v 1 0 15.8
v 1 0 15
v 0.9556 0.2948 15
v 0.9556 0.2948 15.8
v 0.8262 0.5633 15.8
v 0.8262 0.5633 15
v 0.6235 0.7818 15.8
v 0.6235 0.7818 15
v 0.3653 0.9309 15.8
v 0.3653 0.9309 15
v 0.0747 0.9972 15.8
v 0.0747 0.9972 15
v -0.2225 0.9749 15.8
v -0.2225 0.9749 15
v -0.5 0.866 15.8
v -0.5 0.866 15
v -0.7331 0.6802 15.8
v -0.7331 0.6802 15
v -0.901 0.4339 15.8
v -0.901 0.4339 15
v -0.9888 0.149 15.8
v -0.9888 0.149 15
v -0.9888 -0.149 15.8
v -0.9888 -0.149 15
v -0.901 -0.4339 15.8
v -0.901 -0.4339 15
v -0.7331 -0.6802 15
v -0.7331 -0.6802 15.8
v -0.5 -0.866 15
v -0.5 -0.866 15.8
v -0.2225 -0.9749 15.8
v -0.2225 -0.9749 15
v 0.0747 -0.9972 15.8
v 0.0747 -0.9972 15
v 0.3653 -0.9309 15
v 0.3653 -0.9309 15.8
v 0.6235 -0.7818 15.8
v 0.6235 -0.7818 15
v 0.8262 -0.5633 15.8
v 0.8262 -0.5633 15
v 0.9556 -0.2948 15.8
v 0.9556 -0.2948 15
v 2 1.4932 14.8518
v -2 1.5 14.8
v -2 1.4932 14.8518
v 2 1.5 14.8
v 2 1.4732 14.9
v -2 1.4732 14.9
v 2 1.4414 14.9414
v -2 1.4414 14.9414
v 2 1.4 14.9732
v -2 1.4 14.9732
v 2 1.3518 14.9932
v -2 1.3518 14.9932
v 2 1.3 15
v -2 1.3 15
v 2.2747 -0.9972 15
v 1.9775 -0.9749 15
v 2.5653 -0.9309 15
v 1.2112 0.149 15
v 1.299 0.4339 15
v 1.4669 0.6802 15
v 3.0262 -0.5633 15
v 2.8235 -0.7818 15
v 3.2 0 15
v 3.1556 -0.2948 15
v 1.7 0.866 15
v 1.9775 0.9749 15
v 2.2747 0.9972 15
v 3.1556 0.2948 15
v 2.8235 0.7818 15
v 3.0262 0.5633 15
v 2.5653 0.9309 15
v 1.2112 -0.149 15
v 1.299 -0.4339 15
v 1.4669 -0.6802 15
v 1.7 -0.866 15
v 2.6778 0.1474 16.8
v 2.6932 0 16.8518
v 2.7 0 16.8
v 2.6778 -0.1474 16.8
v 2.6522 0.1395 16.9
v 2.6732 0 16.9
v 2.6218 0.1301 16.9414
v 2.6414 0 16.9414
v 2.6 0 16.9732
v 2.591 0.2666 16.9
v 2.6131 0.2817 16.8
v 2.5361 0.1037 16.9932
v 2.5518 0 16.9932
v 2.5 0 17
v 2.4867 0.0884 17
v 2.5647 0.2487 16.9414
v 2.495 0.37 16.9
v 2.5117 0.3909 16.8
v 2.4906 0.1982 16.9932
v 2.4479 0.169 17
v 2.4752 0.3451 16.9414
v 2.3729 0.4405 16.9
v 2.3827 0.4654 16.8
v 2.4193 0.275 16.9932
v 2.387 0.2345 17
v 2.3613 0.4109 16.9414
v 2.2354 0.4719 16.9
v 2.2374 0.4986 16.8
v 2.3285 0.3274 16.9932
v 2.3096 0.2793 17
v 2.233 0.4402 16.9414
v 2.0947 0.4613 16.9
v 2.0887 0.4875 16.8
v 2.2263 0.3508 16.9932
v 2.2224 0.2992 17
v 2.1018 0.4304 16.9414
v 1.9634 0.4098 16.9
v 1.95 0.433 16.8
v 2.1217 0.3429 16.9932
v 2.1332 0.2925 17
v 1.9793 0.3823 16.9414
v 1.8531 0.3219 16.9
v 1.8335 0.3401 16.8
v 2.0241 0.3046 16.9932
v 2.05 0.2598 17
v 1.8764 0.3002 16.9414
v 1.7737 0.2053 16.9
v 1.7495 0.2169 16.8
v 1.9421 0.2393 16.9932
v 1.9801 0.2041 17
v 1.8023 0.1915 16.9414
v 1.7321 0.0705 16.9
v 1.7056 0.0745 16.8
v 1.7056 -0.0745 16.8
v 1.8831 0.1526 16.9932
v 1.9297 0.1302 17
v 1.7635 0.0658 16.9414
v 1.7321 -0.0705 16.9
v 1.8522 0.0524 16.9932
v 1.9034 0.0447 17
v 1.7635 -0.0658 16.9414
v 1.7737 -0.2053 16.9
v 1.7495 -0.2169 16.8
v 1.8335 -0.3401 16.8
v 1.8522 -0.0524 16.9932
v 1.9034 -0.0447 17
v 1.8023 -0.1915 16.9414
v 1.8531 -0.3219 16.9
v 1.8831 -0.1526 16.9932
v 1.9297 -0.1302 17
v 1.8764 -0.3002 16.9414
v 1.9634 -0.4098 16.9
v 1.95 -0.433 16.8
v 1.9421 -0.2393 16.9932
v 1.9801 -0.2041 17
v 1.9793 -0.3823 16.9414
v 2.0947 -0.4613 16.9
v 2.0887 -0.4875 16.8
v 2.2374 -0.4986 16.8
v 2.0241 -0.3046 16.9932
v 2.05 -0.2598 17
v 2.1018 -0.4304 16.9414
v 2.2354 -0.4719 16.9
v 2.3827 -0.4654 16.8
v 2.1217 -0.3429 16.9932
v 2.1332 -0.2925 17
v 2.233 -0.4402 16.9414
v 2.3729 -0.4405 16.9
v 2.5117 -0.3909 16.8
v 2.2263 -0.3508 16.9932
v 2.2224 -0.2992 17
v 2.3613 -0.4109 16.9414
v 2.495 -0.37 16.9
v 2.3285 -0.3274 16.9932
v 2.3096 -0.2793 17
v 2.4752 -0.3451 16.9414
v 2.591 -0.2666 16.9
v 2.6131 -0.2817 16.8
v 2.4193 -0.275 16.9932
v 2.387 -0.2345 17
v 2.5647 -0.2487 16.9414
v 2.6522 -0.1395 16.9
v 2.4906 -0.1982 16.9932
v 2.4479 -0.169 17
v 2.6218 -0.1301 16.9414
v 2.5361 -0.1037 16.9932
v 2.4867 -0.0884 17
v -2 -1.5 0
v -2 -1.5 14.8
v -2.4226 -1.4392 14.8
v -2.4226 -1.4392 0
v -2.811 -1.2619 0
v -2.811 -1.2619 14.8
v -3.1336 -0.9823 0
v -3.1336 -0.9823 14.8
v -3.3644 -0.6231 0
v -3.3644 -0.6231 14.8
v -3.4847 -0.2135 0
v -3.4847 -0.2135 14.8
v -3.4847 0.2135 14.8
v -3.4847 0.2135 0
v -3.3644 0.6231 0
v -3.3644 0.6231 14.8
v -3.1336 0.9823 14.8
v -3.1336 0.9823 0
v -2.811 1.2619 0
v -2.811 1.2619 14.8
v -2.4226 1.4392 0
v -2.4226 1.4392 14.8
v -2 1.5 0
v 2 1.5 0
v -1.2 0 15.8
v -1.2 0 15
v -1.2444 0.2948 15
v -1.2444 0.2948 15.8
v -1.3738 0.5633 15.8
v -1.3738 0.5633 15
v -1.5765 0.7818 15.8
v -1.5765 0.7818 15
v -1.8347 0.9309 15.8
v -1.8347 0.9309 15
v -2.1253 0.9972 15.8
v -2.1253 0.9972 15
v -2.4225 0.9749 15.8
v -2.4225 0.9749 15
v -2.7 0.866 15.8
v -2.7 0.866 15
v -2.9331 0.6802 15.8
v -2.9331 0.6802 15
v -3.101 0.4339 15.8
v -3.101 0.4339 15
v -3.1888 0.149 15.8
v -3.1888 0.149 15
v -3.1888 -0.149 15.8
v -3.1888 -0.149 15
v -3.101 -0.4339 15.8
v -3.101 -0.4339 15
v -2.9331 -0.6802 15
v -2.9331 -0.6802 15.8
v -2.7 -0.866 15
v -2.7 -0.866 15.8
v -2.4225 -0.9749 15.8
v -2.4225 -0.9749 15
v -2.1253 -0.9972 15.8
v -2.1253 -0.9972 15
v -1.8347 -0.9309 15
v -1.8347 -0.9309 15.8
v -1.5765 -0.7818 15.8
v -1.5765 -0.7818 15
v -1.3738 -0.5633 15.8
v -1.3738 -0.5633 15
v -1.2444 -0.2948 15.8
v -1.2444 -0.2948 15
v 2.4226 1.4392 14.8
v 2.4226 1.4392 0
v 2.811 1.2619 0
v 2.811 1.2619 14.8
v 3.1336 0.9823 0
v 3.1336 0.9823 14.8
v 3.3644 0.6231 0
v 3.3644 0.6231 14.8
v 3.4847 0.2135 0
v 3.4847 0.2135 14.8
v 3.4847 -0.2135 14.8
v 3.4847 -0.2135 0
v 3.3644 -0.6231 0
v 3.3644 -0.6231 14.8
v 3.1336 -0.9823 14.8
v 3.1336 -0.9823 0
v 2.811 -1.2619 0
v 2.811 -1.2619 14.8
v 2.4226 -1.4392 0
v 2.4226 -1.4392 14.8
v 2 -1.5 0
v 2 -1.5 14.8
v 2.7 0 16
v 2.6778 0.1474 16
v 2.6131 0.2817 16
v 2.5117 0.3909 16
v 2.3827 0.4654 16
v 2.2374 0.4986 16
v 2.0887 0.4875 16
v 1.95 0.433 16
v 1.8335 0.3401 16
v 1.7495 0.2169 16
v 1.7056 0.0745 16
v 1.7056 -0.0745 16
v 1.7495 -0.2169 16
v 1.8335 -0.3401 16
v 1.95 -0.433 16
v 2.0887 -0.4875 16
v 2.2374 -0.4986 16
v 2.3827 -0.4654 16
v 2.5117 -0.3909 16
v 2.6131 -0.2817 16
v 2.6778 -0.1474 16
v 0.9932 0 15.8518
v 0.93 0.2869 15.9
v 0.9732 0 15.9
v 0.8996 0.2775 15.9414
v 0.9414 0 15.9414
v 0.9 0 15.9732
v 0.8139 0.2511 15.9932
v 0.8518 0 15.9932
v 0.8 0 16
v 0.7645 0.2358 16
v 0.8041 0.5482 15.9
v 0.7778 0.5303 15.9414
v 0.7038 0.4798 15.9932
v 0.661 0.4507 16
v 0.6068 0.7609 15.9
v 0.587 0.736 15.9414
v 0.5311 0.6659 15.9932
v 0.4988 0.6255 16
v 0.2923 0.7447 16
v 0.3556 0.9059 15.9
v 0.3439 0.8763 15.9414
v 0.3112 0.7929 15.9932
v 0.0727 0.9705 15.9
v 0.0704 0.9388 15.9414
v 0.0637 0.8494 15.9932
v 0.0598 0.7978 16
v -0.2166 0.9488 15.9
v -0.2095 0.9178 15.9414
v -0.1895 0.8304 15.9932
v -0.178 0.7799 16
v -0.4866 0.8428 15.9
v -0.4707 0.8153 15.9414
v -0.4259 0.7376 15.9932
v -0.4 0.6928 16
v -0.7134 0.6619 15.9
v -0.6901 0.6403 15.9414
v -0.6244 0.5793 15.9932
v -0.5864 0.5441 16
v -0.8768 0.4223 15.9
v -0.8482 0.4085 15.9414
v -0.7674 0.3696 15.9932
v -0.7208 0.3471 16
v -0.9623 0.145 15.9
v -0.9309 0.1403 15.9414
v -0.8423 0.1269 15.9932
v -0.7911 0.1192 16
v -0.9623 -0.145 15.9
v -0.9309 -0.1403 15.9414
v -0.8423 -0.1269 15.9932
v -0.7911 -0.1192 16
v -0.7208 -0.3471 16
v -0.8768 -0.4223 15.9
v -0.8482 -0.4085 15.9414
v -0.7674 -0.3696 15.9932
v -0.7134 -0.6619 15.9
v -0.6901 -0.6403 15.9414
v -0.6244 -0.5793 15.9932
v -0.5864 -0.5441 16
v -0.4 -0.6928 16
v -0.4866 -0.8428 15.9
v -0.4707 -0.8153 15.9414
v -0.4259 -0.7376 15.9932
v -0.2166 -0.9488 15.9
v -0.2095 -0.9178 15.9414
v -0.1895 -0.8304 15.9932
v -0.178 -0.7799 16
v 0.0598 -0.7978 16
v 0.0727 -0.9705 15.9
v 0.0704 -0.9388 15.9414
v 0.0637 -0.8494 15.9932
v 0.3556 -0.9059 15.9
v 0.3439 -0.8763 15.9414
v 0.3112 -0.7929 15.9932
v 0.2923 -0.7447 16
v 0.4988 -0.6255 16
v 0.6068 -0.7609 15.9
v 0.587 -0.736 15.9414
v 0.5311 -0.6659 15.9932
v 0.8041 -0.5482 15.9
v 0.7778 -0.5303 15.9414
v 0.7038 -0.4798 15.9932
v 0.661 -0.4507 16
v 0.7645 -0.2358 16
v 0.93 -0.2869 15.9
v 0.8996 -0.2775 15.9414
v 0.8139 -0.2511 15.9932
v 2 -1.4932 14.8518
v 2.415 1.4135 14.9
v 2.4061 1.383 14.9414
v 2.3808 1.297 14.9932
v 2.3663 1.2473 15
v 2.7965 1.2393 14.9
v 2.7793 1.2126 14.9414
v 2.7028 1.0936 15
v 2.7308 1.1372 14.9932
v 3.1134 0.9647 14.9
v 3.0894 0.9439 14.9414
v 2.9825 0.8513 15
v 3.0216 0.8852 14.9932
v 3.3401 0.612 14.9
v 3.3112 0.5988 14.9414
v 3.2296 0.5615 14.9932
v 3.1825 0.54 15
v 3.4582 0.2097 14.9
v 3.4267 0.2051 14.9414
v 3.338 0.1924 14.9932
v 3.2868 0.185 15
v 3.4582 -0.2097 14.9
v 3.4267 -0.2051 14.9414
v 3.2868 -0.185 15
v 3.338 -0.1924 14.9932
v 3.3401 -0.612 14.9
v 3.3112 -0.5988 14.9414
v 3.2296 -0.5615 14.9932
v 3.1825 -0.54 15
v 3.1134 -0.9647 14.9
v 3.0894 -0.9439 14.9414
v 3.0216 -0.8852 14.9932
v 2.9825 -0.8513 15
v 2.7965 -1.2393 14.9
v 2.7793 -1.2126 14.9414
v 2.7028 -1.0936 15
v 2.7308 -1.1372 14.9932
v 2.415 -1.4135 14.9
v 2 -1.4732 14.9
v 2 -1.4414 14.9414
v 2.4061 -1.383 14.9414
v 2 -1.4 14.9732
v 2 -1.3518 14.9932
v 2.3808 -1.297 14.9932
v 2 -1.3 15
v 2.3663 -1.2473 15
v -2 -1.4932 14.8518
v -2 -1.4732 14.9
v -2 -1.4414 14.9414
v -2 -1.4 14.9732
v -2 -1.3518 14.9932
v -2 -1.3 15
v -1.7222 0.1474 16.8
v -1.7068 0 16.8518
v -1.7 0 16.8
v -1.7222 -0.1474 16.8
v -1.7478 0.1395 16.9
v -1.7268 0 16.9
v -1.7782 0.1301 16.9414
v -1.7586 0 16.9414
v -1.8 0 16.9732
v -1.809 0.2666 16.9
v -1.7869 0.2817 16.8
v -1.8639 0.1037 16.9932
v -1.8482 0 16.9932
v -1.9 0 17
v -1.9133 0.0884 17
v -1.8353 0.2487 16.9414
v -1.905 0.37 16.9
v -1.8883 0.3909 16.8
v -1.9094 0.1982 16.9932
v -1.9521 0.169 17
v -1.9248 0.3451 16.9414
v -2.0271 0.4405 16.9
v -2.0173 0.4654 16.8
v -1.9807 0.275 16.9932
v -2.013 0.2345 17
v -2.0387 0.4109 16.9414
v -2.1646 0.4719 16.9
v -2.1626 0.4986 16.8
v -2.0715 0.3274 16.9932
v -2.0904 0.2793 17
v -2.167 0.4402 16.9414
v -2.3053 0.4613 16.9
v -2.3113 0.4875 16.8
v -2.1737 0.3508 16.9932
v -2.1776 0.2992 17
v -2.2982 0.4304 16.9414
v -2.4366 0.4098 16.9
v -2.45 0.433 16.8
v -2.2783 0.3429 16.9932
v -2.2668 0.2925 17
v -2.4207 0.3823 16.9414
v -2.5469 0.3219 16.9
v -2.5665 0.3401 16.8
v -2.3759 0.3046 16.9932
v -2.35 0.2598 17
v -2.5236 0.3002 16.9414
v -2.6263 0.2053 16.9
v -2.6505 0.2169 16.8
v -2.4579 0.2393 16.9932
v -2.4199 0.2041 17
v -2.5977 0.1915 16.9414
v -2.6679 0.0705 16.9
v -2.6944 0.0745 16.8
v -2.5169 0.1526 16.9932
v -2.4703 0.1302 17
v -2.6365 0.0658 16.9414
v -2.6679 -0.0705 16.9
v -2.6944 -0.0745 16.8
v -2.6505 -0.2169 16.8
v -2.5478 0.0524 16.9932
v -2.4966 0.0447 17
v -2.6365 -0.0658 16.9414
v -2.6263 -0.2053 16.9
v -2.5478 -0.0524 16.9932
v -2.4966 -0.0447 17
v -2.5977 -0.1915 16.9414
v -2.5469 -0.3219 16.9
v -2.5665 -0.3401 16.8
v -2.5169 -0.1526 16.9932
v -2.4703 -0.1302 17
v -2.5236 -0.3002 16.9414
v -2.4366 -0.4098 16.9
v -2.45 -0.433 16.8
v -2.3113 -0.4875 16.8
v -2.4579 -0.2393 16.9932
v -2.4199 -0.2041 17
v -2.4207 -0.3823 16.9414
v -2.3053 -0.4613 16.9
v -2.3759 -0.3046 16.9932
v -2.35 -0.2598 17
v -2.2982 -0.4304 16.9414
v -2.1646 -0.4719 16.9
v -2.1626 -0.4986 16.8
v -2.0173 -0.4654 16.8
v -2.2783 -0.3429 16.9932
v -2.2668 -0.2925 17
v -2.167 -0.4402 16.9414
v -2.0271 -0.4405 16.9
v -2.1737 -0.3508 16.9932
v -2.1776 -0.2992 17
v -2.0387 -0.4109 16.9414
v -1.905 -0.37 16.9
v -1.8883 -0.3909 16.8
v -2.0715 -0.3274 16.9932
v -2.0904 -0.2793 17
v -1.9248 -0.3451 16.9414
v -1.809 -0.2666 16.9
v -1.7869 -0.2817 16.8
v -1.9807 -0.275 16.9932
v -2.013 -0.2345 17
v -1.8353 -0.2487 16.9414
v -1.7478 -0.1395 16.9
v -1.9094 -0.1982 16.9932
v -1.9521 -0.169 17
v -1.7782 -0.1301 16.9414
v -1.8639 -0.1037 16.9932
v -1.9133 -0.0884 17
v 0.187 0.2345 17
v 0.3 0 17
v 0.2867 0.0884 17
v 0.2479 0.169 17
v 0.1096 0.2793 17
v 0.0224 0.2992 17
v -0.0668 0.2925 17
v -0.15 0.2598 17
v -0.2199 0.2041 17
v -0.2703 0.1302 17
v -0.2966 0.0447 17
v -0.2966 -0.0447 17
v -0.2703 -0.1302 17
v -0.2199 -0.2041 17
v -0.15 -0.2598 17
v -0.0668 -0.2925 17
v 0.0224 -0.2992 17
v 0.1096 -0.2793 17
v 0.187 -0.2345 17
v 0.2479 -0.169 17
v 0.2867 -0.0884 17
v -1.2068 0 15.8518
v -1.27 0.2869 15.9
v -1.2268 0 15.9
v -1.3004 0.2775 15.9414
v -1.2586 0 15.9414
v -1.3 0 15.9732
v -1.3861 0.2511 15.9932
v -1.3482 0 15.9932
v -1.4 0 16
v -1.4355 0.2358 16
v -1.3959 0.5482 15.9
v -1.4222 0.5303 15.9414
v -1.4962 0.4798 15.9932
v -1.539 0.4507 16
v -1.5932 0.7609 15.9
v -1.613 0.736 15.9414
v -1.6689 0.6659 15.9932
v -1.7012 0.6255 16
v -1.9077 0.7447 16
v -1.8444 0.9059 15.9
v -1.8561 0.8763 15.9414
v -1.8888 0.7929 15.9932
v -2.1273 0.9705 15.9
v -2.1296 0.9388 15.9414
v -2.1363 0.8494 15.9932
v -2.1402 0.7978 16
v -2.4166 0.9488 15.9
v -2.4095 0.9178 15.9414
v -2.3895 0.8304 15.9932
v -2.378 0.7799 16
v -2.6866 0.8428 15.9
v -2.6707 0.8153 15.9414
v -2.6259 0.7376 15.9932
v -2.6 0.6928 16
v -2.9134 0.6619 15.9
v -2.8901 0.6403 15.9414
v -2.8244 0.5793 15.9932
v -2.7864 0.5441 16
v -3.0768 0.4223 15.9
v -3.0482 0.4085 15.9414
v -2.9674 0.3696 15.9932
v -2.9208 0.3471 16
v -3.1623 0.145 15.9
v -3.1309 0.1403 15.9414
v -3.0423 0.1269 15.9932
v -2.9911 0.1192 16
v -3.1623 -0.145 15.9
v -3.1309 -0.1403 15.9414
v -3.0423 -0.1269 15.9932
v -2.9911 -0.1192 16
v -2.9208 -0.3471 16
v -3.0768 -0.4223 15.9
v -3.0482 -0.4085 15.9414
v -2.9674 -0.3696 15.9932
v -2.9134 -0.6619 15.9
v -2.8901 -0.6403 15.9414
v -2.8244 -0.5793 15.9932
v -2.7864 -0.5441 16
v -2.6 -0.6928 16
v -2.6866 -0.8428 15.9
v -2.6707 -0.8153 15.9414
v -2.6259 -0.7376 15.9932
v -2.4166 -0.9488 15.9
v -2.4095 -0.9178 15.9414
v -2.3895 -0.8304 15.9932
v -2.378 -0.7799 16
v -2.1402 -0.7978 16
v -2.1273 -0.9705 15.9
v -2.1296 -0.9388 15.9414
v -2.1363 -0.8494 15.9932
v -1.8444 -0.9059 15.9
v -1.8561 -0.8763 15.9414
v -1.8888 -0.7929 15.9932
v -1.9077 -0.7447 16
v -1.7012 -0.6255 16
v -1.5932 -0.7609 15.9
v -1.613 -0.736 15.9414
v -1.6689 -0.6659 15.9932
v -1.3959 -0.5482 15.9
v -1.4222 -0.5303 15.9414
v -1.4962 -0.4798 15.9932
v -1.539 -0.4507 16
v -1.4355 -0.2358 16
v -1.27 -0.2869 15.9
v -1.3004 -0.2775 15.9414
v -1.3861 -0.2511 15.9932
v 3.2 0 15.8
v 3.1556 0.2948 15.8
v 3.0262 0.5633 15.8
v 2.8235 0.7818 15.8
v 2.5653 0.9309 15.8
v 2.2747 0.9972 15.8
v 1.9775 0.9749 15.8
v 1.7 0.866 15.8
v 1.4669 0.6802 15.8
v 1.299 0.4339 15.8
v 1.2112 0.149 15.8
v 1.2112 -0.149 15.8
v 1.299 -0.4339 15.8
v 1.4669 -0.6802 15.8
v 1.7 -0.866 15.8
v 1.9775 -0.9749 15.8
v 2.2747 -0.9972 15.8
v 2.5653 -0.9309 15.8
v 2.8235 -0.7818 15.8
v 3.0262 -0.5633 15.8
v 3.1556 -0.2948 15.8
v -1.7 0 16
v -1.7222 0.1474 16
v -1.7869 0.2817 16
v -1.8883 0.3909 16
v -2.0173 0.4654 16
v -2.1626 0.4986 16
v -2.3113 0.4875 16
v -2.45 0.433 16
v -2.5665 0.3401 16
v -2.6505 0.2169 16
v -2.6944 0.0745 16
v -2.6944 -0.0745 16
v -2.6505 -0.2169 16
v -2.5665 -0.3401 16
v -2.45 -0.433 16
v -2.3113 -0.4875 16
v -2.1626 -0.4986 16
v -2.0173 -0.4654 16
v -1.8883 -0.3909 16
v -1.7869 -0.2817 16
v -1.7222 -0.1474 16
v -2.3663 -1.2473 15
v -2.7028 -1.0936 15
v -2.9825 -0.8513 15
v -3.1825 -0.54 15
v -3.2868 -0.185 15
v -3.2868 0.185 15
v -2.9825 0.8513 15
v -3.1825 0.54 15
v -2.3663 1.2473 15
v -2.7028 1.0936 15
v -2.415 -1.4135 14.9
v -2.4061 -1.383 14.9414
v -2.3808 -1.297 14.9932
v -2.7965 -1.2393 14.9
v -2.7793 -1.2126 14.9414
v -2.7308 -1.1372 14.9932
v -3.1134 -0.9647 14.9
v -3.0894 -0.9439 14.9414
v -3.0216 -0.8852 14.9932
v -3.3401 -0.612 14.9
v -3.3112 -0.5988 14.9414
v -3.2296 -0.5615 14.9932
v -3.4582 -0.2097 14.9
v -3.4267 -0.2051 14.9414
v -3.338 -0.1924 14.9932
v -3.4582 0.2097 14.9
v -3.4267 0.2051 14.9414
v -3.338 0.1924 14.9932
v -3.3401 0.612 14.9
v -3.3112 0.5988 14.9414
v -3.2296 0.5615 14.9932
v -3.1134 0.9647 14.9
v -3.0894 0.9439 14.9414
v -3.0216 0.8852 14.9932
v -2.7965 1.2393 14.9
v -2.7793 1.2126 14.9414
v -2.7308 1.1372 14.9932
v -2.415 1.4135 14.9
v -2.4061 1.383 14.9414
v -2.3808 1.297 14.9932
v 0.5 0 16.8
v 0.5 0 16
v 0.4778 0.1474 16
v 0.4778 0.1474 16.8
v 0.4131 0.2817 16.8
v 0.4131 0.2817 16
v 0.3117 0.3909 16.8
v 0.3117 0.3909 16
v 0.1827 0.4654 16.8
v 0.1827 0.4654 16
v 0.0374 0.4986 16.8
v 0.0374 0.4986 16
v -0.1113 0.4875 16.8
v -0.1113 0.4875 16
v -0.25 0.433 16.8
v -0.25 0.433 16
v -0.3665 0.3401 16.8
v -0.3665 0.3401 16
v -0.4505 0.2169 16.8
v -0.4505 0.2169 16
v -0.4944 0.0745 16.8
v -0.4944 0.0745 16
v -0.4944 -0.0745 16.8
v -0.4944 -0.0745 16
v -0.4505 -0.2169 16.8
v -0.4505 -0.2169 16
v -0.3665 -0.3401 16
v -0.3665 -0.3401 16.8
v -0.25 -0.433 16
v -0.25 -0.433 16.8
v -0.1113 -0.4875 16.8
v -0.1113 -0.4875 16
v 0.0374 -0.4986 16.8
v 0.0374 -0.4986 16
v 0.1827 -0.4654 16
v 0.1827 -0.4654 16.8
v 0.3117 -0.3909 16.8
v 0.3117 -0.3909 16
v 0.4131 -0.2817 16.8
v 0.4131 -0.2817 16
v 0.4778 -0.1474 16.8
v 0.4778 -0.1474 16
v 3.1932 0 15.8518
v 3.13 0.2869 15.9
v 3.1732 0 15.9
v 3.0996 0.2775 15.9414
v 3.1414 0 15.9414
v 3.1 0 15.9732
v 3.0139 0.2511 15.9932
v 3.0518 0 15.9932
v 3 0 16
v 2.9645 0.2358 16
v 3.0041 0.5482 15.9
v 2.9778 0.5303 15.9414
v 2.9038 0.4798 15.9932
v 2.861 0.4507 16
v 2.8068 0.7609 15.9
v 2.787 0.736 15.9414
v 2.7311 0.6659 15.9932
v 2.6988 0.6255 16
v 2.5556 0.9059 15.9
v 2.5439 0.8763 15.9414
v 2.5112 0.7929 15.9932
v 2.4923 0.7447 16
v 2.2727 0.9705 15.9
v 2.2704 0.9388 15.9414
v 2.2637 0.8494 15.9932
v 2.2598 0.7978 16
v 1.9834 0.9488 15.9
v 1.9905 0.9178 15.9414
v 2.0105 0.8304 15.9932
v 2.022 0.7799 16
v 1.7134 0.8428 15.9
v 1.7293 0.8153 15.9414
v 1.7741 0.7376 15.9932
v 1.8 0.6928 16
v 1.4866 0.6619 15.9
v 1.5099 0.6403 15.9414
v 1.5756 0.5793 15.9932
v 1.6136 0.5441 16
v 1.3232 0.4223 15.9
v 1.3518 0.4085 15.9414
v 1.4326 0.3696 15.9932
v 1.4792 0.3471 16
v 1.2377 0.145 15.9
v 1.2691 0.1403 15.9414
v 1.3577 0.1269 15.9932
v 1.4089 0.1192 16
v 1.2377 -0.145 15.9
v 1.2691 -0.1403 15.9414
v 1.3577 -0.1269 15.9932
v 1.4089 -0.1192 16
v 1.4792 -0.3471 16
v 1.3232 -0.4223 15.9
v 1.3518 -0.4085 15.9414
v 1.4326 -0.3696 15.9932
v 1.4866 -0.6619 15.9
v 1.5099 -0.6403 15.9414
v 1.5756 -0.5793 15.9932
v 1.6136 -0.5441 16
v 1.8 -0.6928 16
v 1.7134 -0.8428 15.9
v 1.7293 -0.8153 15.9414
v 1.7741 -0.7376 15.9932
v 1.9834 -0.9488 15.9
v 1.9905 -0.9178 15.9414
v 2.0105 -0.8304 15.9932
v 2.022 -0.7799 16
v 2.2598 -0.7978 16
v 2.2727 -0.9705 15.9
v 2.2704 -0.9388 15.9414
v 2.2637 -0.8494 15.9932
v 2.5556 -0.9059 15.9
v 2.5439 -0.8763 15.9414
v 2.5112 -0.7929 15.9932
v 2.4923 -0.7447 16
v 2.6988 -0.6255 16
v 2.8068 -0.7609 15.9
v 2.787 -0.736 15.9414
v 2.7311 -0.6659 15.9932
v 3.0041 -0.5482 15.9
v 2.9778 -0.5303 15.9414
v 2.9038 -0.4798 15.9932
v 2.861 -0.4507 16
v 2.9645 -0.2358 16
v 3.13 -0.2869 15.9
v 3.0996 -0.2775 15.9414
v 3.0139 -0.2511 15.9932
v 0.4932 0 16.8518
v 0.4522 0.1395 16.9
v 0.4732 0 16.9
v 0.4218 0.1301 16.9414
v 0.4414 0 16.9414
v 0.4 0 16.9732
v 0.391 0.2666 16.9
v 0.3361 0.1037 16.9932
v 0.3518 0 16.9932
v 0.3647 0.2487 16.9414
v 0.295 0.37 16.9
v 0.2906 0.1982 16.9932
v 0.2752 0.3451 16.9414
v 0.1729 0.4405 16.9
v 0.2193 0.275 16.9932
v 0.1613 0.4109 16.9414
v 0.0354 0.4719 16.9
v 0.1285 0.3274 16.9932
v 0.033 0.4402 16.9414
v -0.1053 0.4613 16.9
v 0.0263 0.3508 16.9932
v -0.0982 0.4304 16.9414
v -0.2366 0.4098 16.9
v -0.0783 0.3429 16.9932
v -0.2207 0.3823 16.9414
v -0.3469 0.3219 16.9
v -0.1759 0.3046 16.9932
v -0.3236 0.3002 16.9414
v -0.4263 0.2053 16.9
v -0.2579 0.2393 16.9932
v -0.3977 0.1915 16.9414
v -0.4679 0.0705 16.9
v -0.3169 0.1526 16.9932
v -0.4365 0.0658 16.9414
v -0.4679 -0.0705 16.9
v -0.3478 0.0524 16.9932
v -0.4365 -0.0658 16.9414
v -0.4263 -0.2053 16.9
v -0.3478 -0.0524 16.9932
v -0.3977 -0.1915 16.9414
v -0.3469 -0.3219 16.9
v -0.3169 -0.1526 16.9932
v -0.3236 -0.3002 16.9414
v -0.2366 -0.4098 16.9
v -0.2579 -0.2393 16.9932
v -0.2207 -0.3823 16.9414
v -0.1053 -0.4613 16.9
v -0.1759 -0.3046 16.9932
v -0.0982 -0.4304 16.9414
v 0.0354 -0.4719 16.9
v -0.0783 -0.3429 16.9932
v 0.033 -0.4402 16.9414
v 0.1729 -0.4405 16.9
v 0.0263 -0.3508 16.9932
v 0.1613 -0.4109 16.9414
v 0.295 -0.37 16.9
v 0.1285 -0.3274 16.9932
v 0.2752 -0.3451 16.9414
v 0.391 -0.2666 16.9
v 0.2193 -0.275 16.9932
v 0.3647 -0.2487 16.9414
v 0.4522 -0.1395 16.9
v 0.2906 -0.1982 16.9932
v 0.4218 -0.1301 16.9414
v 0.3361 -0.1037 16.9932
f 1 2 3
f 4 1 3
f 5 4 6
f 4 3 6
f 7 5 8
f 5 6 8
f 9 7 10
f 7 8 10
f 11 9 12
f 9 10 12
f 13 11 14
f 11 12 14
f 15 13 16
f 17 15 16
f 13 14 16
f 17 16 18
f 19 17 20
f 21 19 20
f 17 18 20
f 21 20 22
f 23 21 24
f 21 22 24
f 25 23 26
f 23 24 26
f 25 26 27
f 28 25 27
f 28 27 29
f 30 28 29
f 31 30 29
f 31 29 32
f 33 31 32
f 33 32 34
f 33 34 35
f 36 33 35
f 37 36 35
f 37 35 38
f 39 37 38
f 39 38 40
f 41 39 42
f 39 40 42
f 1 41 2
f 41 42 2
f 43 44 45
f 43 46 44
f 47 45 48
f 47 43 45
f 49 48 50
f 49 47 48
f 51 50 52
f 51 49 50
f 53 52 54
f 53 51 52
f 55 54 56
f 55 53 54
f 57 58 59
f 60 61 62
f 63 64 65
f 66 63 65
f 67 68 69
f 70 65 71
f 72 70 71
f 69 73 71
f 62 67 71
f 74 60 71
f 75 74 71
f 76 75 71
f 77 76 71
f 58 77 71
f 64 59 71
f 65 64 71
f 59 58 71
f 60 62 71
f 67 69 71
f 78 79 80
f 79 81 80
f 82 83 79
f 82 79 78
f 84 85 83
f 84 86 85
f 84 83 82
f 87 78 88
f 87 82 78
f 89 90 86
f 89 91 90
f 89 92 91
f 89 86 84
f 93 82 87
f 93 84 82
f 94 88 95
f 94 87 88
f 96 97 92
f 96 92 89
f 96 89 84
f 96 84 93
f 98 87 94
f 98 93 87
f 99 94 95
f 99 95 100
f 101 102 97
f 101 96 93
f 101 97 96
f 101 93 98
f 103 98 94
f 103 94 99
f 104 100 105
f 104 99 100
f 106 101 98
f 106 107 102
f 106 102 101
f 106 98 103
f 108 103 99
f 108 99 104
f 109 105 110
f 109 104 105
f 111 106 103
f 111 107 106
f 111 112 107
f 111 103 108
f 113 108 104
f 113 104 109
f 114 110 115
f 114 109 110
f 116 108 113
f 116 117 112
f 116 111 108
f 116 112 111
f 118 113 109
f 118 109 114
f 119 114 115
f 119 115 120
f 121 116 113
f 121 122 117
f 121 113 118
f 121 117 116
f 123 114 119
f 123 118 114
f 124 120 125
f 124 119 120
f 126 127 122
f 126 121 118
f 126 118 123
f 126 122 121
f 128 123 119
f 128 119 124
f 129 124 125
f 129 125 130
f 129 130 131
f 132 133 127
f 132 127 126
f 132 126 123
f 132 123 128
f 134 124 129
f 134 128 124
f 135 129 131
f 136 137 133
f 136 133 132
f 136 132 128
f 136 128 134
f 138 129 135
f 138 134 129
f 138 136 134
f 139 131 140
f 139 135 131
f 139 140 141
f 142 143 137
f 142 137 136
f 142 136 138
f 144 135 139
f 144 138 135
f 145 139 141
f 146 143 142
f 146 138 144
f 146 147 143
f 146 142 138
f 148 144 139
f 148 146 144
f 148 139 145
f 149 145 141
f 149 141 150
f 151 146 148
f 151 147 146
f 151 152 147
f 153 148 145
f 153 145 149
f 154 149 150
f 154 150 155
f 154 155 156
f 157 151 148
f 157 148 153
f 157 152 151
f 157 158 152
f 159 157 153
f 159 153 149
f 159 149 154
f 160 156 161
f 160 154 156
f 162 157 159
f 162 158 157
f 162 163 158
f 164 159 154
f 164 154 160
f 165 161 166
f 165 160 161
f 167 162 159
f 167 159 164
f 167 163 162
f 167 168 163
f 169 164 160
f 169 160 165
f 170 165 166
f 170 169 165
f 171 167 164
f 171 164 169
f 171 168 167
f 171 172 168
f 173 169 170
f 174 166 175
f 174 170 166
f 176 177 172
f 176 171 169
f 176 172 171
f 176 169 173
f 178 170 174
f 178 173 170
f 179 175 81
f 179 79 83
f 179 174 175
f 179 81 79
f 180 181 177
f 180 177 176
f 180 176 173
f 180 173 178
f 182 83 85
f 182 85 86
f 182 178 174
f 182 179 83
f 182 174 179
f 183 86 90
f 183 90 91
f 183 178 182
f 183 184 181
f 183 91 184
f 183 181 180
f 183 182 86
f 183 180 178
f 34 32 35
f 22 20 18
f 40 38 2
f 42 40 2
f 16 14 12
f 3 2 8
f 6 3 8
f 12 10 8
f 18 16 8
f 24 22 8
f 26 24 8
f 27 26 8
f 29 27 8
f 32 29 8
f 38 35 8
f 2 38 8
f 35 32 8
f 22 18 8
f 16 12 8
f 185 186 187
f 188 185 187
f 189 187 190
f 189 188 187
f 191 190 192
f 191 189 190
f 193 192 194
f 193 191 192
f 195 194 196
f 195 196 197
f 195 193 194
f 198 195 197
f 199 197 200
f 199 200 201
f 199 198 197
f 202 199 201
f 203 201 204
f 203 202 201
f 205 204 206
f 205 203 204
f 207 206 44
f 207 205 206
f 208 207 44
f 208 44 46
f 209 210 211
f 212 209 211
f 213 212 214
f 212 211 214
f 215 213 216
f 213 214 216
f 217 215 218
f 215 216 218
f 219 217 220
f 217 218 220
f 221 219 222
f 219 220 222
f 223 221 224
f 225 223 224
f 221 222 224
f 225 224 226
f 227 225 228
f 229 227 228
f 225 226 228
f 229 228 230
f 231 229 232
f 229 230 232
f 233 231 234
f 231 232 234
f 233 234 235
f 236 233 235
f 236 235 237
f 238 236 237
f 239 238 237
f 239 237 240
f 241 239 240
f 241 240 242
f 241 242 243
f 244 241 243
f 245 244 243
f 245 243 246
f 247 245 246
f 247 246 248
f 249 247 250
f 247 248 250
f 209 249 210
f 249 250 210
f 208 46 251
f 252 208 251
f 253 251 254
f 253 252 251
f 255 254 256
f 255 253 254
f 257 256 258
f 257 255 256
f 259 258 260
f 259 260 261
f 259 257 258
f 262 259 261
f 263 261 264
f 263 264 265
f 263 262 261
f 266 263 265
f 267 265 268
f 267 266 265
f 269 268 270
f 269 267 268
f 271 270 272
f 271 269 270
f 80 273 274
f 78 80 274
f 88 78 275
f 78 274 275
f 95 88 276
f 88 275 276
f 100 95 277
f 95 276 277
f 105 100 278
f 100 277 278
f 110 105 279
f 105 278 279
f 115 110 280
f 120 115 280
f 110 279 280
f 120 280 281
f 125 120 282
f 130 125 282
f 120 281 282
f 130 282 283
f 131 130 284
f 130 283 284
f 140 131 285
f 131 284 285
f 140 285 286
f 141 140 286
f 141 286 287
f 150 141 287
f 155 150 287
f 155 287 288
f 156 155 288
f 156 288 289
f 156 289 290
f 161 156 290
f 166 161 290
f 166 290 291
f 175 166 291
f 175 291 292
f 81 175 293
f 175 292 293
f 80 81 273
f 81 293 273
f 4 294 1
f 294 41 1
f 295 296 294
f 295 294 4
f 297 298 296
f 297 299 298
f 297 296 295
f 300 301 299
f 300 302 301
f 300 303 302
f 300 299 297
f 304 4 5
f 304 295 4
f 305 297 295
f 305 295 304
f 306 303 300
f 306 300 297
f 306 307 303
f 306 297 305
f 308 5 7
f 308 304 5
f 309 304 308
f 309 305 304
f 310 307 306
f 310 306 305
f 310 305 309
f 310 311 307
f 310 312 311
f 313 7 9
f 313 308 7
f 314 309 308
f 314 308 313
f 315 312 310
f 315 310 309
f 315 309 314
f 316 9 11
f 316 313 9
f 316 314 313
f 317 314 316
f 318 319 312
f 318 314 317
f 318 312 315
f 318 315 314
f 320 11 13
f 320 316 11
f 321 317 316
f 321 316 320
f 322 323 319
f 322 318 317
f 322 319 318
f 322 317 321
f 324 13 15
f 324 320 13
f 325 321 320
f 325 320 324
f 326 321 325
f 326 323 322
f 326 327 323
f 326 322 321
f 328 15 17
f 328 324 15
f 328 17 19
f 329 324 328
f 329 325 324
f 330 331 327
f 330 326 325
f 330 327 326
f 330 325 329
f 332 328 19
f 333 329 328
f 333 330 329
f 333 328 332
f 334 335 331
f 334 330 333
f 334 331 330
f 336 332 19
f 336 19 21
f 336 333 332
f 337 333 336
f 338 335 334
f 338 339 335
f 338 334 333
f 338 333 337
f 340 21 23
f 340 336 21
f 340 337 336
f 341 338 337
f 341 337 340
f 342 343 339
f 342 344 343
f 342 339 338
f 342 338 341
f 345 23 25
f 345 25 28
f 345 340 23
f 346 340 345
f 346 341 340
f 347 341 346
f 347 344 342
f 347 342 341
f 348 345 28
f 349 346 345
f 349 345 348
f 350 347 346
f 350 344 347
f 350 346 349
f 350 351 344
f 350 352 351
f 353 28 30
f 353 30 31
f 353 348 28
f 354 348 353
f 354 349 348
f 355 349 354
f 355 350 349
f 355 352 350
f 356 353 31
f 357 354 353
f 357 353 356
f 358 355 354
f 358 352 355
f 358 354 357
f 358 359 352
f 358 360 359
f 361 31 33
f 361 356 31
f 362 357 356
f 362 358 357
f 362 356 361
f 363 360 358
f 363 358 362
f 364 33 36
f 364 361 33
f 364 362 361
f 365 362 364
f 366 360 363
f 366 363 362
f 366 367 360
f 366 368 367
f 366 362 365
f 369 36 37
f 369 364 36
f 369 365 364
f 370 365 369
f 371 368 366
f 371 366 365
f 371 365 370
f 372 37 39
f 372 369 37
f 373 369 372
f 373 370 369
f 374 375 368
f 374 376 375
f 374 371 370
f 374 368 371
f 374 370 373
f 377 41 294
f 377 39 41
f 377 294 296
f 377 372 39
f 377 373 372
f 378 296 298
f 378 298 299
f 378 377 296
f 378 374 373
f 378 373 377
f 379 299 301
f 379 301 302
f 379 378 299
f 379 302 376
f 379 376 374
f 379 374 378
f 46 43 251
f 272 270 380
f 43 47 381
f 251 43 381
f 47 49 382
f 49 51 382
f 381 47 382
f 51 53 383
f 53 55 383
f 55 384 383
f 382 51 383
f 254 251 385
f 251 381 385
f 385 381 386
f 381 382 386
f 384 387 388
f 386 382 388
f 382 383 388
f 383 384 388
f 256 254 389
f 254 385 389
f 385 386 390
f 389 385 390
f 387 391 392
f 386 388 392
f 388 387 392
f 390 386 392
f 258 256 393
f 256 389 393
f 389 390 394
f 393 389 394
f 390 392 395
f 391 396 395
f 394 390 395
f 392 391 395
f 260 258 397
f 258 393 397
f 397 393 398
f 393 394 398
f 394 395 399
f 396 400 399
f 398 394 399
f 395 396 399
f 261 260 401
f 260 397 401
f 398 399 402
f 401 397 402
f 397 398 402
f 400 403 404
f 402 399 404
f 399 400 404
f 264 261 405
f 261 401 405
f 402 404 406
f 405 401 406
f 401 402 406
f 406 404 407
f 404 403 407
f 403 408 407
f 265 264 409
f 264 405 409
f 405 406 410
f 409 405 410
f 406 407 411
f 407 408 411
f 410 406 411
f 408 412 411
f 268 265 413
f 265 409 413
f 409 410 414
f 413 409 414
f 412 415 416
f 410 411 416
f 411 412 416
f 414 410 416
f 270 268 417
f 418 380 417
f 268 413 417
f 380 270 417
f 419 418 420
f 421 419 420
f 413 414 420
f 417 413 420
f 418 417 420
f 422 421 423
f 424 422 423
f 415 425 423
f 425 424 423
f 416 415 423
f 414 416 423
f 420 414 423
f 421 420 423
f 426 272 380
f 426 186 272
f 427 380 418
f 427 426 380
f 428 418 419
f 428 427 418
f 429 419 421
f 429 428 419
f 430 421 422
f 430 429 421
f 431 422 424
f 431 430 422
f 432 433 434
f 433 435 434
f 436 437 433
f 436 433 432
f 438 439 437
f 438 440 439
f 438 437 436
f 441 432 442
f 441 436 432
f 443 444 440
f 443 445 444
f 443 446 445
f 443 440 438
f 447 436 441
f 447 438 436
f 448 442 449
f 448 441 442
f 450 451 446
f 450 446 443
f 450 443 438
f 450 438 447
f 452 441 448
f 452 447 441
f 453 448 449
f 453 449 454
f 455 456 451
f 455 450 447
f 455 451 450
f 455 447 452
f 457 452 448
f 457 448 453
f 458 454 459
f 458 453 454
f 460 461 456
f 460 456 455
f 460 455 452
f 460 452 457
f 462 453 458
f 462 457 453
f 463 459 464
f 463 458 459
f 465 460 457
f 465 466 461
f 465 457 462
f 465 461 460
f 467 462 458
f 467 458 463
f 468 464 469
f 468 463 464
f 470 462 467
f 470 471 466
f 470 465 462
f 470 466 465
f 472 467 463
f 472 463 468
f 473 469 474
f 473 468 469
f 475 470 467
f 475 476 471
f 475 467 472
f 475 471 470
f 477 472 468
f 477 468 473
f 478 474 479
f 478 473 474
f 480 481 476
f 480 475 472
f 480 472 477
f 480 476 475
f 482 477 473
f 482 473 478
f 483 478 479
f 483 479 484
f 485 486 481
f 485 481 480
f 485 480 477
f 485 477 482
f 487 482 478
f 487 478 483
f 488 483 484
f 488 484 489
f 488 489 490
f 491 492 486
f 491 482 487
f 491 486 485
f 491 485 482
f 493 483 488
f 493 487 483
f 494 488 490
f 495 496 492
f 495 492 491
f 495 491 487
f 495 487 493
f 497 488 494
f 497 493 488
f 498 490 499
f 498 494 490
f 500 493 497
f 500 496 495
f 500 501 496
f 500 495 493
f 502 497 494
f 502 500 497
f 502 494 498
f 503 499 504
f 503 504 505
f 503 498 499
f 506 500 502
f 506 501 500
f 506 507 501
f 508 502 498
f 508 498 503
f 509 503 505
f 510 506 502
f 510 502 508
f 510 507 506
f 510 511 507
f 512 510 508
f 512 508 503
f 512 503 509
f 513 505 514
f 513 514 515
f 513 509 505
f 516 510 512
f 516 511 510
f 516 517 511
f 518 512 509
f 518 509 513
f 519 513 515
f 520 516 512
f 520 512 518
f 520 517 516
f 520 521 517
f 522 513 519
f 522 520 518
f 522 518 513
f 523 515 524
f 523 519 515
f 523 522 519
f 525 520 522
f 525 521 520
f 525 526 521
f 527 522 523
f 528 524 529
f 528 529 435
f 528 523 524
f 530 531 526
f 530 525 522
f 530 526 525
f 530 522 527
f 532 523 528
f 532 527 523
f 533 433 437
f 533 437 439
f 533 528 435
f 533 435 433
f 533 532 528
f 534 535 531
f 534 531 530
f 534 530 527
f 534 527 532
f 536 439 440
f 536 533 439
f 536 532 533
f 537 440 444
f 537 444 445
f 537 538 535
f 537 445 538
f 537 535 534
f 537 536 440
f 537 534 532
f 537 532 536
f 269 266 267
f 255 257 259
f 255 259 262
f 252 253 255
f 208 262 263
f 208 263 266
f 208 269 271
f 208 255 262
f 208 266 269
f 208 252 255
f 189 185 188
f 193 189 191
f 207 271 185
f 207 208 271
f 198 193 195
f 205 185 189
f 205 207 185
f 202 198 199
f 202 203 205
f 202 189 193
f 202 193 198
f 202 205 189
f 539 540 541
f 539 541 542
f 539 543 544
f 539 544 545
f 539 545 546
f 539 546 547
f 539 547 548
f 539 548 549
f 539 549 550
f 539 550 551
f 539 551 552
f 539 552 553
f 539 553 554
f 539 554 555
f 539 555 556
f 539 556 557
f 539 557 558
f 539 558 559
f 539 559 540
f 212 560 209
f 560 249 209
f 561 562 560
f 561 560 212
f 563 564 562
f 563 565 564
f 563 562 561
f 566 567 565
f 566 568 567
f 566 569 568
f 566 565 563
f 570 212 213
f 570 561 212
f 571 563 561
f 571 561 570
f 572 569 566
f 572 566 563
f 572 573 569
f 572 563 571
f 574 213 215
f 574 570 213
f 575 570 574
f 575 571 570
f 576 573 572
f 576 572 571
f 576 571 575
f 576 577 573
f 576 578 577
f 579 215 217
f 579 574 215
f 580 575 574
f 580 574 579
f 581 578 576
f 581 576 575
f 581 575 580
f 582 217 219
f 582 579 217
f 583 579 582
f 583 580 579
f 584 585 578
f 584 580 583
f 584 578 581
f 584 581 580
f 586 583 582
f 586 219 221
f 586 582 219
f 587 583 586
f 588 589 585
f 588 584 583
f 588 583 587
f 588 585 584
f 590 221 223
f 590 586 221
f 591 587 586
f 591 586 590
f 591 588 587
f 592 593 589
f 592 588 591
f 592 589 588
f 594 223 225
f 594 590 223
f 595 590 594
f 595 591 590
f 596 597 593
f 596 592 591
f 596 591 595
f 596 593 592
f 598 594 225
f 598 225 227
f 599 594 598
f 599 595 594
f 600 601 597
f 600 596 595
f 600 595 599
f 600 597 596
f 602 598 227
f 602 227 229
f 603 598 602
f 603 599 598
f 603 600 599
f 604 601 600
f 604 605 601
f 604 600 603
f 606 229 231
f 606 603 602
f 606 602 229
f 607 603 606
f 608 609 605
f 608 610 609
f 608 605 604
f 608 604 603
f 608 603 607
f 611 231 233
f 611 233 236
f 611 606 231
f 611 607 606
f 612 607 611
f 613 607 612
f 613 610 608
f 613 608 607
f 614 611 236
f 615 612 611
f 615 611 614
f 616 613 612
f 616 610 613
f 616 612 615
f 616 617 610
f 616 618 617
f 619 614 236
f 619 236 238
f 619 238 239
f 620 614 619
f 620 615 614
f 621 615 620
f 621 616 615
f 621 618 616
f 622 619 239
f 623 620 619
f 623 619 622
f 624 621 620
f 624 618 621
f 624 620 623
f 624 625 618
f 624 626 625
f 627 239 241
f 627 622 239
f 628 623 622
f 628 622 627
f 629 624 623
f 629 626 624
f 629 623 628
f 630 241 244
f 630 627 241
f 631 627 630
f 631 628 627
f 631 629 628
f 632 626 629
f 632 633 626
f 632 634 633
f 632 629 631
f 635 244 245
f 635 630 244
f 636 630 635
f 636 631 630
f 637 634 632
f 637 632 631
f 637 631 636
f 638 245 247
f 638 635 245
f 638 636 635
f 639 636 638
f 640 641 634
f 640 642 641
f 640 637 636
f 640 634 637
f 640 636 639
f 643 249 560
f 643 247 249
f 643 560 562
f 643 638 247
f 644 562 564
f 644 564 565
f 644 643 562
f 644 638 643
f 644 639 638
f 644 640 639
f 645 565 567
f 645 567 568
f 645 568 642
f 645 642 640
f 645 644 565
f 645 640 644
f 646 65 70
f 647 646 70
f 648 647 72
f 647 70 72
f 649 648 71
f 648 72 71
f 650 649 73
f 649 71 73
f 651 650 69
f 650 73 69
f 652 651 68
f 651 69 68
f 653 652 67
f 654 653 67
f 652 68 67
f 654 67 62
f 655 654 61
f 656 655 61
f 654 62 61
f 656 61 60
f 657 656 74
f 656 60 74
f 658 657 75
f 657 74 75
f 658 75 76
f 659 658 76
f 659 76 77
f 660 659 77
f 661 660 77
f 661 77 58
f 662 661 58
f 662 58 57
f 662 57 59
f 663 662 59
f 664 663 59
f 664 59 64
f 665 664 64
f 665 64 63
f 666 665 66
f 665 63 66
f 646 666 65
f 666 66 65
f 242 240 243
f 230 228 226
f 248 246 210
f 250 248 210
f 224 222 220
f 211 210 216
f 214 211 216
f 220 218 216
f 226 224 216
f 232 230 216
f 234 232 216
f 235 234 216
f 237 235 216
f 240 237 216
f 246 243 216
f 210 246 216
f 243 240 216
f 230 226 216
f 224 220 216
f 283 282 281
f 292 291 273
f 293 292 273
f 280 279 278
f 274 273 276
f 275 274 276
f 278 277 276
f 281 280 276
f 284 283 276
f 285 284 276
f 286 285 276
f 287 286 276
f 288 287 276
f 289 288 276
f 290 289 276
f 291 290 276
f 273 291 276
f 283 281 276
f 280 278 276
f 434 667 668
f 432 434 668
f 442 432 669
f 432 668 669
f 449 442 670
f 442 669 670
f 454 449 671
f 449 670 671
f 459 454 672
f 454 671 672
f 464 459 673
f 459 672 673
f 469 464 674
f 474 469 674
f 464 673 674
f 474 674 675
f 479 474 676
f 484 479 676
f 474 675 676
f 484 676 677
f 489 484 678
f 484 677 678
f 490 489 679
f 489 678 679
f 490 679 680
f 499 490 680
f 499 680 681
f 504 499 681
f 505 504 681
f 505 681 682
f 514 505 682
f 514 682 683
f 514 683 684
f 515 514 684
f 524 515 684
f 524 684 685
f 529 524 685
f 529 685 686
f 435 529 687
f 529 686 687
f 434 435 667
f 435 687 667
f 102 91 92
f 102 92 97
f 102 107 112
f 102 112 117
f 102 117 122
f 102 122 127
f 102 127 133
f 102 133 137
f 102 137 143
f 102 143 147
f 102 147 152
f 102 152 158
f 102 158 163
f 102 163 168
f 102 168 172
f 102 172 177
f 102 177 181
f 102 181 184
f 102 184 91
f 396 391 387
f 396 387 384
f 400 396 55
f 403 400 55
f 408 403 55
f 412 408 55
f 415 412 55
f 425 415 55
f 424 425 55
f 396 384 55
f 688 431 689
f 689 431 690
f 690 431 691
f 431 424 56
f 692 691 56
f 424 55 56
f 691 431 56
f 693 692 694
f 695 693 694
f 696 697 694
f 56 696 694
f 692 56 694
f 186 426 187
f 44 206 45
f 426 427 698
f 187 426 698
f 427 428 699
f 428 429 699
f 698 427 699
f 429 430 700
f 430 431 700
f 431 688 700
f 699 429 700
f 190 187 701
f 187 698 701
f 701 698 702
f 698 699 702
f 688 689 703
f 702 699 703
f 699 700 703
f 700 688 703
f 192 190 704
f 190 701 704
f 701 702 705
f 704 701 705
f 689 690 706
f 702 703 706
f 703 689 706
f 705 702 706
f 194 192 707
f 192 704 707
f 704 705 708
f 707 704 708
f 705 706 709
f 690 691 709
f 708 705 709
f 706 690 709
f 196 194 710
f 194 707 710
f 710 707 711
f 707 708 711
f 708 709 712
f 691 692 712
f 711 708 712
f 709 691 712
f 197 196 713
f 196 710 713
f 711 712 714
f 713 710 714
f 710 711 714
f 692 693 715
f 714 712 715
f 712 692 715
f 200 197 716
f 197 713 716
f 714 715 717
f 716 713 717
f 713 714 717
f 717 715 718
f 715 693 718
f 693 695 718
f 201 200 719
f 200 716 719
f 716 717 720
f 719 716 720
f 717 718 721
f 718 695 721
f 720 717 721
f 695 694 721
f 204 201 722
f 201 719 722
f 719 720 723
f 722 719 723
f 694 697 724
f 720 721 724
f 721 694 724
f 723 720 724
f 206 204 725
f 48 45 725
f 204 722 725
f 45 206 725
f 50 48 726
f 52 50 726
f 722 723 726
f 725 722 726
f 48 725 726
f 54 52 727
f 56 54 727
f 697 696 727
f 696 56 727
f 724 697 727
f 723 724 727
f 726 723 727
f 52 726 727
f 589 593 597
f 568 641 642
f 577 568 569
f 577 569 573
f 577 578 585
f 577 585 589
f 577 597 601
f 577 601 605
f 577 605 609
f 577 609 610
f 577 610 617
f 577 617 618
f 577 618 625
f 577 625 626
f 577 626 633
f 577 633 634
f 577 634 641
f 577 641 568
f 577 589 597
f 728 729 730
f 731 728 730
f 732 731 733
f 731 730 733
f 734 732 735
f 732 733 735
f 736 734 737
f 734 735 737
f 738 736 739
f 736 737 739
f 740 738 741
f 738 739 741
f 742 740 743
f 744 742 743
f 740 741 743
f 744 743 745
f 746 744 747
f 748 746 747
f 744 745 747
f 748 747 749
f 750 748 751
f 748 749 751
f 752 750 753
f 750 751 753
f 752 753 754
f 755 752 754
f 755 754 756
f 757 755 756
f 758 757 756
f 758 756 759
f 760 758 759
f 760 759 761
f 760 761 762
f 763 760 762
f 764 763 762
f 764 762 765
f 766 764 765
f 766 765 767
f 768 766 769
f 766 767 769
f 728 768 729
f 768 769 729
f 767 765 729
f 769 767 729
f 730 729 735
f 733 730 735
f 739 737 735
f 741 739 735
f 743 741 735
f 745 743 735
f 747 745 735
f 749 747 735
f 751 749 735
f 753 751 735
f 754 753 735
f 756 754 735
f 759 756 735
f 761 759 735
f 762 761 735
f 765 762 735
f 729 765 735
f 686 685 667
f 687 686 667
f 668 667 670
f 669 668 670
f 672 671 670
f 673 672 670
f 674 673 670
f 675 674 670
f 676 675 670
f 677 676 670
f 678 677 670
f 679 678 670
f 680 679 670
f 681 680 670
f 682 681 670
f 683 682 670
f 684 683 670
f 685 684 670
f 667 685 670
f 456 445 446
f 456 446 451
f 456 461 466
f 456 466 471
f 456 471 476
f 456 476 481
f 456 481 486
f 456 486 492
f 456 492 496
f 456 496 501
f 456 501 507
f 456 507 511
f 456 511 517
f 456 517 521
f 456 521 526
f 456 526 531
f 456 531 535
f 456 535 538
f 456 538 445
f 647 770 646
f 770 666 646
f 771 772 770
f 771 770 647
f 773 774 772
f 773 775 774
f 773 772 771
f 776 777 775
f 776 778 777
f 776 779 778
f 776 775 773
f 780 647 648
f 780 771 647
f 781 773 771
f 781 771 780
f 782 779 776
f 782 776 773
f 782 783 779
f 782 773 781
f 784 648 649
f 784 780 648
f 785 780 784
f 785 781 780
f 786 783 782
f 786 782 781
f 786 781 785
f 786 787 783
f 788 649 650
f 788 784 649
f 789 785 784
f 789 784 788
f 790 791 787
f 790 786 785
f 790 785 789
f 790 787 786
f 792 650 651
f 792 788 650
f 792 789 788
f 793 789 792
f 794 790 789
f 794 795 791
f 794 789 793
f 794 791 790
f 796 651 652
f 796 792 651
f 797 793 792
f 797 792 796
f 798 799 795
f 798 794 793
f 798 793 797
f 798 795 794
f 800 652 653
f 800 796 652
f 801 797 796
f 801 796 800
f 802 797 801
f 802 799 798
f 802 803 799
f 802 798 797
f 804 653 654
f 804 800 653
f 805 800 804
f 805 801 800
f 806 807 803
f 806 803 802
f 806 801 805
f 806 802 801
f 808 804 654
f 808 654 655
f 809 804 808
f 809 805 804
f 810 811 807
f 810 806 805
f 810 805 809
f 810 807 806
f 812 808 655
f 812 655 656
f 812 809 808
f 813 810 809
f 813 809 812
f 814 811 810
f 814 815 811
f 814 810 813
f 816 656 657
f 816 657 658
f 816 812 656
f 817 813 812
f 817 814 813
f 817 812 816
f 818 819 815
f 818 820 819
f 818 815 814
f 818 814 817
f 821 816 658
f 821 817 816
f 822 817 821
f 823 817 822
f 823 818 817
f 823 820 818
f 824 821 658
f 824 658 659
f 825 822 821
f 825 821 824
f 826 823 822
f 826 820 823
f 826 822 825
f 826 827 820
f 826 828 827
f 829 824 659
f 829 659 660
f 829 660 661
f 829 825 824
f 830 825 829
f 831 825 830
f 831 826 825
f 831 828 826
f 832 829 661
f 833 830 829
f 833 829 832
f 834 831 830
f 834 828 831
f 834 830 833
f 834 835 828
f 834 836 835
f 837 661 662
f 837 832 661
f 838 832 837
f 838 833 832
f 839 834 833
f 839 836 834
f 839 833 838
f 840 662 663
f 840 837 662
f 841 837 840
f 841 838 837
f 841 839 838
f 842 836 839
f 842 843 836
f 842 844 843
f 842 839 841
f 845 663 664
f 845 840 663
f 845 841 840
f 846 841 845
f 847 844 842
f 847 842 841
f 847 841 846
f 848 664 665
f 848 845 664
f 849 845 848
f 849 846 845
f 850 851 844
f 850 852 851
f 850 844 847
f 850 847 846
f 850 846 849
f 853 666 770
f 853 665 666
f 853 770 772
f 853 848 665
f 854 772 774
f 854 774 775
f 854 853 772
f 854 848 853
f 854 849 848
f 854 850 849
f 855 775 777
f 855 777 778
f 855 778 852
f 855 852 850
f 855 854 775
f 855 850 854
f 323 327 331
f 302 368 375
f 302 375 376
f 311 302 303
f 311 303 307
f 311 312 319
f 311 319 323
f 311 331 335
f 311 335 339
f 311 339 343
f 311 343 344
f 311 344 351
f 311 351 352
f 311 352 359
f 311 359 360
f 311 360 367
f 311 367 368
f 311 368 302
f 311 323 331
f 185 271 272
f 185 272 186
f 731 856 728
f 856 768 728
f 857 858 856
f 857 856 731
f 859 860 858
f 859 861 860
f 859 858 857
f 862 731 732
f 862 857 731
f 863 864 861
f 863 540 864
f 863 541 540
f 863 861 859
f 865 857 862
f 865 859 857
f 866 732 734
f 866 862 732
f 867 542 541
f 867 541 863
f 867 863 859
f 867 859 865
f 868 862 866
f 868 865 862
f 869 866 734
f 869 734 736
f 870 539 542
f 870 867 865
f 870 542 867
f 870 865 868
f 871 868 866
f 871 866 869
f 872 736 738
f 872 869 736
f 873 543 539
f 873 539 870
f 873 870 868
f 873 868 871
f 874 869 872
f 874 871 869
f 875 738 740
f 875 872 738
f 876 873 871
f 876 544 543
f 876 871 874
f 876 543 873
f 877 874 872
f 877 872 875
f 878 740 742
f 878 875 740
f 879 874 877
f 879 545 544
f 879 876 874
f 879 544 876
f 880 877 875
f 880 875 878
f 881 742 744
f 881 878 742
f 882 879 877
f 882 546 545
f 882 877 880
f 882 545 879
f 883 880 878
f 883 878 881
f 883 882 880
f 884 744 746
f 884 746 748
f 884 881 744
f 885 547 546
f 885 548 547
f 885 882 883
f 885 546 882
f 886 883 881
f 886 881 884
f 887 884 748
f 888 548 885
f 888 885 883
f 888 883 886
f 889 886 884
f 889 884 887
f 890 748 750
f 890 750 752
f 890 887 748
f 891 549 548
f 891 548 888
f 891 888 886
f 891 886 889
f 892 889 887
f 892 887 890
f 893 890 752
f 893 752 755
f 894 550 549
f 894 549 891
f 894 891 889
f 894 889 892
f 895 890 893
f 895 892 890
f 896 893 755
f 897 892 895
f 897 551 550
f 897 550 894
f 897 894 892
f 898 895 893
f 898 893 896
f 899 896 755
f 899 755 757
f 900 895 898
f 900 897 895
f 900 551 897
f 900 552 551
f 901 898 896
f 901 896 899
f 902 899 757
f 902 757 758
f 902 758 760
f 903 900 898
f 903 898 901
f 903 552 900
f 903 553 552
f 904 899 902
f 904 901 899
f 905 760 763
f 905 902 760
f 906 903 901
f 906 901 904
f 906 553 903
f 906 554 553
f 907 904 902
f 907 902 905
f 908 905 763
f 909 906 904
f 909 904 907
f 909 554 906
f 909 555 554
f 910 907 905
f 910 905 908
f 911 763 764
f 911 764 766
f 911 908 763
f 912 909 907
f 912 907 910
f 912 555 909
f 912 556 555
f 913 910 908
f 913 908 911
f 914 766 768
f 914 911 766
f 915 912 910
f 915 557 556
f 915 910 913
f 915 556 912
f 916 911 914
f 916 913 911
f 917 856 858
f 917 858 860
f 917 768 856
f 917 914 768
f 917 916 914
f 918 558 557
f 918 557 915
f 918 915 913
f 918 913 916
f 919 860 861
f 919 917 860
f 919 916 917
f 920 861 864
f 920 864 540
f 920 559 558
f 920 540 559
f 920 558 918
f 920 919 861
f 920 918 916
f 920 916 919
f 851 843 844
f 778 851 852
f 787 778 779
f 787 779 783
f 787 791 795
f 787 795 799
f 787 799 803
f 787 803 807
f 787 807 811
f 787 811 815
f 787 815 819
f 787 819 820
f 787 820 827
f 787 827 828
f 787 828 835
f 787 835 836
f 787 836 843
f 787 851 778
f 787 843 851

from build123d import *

# Parameters (mm, degrees)
EXTRUDE_1_DEPTH   = 15
SKETCH_2_R        = 1
EXTRUDE_2_DEPTH   = 1
EXTRUDE_2_2_DEPTH = 1
EXTRUDE_2_3_DEPTH = 1
SKETCH_4_R        = 0.5
EXTRUDE_3_DEPTH   = 1
EXTRUDE_3_2_DEPTH = 1
EXTRUDE_3_3_DEPTH = 1
FILLET_1_R        = 0.2
FILLET_2_R        = 0.2
FILLET_3_R        = 0.2
FILLET_4_R        = 0.2
FILLET_5_R        = 0.2
FILLET_6_R        = 0.2
FILLET_7_R        = 0.2


with BuildPart() as part:
    # Эскиз1 → Бобышка-Вытянуть1 (new body)
    with BuildSketch(Plane.XY):
        with BuildLine():
            Line((-2, 1.5), (2, 1.5))
            ThreePointArc((2, 1.5), (3.5, 0), (2, -1.5))
            Line((2, -1.5), (-2, -1.5))
            ThreePointArc((-2, -1.5), (-3.5, 0), (-2, 1.5))
        make_face()
    extrude(amount=EXTRUDE_1_DEPTH)

    # Скругление1
    fillet_1_edges = [part.edges().sort_by_distance(p)[0] for p in [
        (3.5, 0, 15),
        (0, 1.5, 15),
        (-3.5, 0, 15),
        (0, -1.5, 15),
    ]]
    fillet(fillet_1_edges, radius=FILLET_1_R)


with BuildPart() as body_2:
    # Эскиз2 → Бобышка-Вытянуть2 (new body)
    with BuildSketch(Plane.XY.offset(15)):
        with Locations((-2.2, 0)):
            Circle(SKETCH_2_R)
    extrude(amount=EXTRUDE_2_DEPTH)

    # Скругление2
    fillet_2_edges = [body_2.edges().sort_by_distance(p)[0] for p in [
        (-3.2, 0, 16),
    ]]
    fillet(fillet_2_edges, radius=FILLET_2_R)


with BuildPart() as body_3:
    # Эскиз2 → Extrude 2 2 (new body)
    with BuildSketch(Plane.XY.offset(15)):
        Circle(SKETCH_2_R)
    extrude(amount=EXTRUDE_2_2_DEPTH)

    # Скругление3
    fillet_3_edges = [body_3.edges().sort_by_distance(p)[0] for p in [
        (-1, 0, 16),
    ]]
    fillet(fillet_3_edges, radius=FILLET_3_R)


with BuildPart() as body_4:
    # Эскиз2 → Extrude 2 3 (new body)
    with BuildSketch(Plane.XY.offset(15)):
        with Locations((2.2, 0)):
            Circle(SKETCH_2_R)
    extrude(amount=EXTRUDE_2_3_DEPTH)

    # Скругление4
    fillet_4_edges = [body_4.edges().sort_by_distance(p)[0] for p in [
        (1.2, 0, 16),
    ]]
    fillet(fillet_4_edges, radius=FILLET_4_R)


with BuildPart() as body_5:
    # Эскиз4 → Бобышка-Вытянуть3 (new body)
    with BuildSketch(Plane.XY.offset(16)):
        Circle(SKETCH_4_R)
    extrude(amount=EXTRUDE_3_DEPTH)

    # Скругление6
    fillet_6_edges = [body_5.edges().sort_by_distance(p)[0] for p in [
        (-0.5, 0, 17),
    ]]
    fillet(fillet_6_edges, radius=FILLET_6_R)


with BuildPart() as body_6:
    # Эскиз4 → Extrude 3 2 (new body)
    with BuildSketch(Plane.XY.offset(16)):
        with Locations((-2.2, 0)):
            Circle(SKETCH_4_R)
    extrude(amount=EXTRUDE_3_2_DEPTH)

    # Скругление5
    fillet_5_edges = [body_6.edges().sort_by_distance(p)[0] for p in [
        (-2.7, 0, 17),
    ]]
    fillet(fillet_5_edges, radius=FILLET_5_R)


with BuildPart() as body_7:
    # Эскиз4 → Extrude 3 3 (new body)
    with BuildSketch(Plane.XY.offset(16)):
        with Locations((2.2, 0)):
            Circle(SKETCH_4_R)
    extrude(amount=EXTRUDE_3_3_DEPTH)

    # Скругление7
    fillet_7_edges = [body_7.edges().sort_by_distance(p)[0] for p in [
        (1.7, 0, 17),
    ]]
    fillet(fillet_7_edges, radius=FILLET_7_R)


solid = Compound([part.part, body_2.part, body_3.part, body_4.part, body_5.part, body_6.part, body_7.part])
